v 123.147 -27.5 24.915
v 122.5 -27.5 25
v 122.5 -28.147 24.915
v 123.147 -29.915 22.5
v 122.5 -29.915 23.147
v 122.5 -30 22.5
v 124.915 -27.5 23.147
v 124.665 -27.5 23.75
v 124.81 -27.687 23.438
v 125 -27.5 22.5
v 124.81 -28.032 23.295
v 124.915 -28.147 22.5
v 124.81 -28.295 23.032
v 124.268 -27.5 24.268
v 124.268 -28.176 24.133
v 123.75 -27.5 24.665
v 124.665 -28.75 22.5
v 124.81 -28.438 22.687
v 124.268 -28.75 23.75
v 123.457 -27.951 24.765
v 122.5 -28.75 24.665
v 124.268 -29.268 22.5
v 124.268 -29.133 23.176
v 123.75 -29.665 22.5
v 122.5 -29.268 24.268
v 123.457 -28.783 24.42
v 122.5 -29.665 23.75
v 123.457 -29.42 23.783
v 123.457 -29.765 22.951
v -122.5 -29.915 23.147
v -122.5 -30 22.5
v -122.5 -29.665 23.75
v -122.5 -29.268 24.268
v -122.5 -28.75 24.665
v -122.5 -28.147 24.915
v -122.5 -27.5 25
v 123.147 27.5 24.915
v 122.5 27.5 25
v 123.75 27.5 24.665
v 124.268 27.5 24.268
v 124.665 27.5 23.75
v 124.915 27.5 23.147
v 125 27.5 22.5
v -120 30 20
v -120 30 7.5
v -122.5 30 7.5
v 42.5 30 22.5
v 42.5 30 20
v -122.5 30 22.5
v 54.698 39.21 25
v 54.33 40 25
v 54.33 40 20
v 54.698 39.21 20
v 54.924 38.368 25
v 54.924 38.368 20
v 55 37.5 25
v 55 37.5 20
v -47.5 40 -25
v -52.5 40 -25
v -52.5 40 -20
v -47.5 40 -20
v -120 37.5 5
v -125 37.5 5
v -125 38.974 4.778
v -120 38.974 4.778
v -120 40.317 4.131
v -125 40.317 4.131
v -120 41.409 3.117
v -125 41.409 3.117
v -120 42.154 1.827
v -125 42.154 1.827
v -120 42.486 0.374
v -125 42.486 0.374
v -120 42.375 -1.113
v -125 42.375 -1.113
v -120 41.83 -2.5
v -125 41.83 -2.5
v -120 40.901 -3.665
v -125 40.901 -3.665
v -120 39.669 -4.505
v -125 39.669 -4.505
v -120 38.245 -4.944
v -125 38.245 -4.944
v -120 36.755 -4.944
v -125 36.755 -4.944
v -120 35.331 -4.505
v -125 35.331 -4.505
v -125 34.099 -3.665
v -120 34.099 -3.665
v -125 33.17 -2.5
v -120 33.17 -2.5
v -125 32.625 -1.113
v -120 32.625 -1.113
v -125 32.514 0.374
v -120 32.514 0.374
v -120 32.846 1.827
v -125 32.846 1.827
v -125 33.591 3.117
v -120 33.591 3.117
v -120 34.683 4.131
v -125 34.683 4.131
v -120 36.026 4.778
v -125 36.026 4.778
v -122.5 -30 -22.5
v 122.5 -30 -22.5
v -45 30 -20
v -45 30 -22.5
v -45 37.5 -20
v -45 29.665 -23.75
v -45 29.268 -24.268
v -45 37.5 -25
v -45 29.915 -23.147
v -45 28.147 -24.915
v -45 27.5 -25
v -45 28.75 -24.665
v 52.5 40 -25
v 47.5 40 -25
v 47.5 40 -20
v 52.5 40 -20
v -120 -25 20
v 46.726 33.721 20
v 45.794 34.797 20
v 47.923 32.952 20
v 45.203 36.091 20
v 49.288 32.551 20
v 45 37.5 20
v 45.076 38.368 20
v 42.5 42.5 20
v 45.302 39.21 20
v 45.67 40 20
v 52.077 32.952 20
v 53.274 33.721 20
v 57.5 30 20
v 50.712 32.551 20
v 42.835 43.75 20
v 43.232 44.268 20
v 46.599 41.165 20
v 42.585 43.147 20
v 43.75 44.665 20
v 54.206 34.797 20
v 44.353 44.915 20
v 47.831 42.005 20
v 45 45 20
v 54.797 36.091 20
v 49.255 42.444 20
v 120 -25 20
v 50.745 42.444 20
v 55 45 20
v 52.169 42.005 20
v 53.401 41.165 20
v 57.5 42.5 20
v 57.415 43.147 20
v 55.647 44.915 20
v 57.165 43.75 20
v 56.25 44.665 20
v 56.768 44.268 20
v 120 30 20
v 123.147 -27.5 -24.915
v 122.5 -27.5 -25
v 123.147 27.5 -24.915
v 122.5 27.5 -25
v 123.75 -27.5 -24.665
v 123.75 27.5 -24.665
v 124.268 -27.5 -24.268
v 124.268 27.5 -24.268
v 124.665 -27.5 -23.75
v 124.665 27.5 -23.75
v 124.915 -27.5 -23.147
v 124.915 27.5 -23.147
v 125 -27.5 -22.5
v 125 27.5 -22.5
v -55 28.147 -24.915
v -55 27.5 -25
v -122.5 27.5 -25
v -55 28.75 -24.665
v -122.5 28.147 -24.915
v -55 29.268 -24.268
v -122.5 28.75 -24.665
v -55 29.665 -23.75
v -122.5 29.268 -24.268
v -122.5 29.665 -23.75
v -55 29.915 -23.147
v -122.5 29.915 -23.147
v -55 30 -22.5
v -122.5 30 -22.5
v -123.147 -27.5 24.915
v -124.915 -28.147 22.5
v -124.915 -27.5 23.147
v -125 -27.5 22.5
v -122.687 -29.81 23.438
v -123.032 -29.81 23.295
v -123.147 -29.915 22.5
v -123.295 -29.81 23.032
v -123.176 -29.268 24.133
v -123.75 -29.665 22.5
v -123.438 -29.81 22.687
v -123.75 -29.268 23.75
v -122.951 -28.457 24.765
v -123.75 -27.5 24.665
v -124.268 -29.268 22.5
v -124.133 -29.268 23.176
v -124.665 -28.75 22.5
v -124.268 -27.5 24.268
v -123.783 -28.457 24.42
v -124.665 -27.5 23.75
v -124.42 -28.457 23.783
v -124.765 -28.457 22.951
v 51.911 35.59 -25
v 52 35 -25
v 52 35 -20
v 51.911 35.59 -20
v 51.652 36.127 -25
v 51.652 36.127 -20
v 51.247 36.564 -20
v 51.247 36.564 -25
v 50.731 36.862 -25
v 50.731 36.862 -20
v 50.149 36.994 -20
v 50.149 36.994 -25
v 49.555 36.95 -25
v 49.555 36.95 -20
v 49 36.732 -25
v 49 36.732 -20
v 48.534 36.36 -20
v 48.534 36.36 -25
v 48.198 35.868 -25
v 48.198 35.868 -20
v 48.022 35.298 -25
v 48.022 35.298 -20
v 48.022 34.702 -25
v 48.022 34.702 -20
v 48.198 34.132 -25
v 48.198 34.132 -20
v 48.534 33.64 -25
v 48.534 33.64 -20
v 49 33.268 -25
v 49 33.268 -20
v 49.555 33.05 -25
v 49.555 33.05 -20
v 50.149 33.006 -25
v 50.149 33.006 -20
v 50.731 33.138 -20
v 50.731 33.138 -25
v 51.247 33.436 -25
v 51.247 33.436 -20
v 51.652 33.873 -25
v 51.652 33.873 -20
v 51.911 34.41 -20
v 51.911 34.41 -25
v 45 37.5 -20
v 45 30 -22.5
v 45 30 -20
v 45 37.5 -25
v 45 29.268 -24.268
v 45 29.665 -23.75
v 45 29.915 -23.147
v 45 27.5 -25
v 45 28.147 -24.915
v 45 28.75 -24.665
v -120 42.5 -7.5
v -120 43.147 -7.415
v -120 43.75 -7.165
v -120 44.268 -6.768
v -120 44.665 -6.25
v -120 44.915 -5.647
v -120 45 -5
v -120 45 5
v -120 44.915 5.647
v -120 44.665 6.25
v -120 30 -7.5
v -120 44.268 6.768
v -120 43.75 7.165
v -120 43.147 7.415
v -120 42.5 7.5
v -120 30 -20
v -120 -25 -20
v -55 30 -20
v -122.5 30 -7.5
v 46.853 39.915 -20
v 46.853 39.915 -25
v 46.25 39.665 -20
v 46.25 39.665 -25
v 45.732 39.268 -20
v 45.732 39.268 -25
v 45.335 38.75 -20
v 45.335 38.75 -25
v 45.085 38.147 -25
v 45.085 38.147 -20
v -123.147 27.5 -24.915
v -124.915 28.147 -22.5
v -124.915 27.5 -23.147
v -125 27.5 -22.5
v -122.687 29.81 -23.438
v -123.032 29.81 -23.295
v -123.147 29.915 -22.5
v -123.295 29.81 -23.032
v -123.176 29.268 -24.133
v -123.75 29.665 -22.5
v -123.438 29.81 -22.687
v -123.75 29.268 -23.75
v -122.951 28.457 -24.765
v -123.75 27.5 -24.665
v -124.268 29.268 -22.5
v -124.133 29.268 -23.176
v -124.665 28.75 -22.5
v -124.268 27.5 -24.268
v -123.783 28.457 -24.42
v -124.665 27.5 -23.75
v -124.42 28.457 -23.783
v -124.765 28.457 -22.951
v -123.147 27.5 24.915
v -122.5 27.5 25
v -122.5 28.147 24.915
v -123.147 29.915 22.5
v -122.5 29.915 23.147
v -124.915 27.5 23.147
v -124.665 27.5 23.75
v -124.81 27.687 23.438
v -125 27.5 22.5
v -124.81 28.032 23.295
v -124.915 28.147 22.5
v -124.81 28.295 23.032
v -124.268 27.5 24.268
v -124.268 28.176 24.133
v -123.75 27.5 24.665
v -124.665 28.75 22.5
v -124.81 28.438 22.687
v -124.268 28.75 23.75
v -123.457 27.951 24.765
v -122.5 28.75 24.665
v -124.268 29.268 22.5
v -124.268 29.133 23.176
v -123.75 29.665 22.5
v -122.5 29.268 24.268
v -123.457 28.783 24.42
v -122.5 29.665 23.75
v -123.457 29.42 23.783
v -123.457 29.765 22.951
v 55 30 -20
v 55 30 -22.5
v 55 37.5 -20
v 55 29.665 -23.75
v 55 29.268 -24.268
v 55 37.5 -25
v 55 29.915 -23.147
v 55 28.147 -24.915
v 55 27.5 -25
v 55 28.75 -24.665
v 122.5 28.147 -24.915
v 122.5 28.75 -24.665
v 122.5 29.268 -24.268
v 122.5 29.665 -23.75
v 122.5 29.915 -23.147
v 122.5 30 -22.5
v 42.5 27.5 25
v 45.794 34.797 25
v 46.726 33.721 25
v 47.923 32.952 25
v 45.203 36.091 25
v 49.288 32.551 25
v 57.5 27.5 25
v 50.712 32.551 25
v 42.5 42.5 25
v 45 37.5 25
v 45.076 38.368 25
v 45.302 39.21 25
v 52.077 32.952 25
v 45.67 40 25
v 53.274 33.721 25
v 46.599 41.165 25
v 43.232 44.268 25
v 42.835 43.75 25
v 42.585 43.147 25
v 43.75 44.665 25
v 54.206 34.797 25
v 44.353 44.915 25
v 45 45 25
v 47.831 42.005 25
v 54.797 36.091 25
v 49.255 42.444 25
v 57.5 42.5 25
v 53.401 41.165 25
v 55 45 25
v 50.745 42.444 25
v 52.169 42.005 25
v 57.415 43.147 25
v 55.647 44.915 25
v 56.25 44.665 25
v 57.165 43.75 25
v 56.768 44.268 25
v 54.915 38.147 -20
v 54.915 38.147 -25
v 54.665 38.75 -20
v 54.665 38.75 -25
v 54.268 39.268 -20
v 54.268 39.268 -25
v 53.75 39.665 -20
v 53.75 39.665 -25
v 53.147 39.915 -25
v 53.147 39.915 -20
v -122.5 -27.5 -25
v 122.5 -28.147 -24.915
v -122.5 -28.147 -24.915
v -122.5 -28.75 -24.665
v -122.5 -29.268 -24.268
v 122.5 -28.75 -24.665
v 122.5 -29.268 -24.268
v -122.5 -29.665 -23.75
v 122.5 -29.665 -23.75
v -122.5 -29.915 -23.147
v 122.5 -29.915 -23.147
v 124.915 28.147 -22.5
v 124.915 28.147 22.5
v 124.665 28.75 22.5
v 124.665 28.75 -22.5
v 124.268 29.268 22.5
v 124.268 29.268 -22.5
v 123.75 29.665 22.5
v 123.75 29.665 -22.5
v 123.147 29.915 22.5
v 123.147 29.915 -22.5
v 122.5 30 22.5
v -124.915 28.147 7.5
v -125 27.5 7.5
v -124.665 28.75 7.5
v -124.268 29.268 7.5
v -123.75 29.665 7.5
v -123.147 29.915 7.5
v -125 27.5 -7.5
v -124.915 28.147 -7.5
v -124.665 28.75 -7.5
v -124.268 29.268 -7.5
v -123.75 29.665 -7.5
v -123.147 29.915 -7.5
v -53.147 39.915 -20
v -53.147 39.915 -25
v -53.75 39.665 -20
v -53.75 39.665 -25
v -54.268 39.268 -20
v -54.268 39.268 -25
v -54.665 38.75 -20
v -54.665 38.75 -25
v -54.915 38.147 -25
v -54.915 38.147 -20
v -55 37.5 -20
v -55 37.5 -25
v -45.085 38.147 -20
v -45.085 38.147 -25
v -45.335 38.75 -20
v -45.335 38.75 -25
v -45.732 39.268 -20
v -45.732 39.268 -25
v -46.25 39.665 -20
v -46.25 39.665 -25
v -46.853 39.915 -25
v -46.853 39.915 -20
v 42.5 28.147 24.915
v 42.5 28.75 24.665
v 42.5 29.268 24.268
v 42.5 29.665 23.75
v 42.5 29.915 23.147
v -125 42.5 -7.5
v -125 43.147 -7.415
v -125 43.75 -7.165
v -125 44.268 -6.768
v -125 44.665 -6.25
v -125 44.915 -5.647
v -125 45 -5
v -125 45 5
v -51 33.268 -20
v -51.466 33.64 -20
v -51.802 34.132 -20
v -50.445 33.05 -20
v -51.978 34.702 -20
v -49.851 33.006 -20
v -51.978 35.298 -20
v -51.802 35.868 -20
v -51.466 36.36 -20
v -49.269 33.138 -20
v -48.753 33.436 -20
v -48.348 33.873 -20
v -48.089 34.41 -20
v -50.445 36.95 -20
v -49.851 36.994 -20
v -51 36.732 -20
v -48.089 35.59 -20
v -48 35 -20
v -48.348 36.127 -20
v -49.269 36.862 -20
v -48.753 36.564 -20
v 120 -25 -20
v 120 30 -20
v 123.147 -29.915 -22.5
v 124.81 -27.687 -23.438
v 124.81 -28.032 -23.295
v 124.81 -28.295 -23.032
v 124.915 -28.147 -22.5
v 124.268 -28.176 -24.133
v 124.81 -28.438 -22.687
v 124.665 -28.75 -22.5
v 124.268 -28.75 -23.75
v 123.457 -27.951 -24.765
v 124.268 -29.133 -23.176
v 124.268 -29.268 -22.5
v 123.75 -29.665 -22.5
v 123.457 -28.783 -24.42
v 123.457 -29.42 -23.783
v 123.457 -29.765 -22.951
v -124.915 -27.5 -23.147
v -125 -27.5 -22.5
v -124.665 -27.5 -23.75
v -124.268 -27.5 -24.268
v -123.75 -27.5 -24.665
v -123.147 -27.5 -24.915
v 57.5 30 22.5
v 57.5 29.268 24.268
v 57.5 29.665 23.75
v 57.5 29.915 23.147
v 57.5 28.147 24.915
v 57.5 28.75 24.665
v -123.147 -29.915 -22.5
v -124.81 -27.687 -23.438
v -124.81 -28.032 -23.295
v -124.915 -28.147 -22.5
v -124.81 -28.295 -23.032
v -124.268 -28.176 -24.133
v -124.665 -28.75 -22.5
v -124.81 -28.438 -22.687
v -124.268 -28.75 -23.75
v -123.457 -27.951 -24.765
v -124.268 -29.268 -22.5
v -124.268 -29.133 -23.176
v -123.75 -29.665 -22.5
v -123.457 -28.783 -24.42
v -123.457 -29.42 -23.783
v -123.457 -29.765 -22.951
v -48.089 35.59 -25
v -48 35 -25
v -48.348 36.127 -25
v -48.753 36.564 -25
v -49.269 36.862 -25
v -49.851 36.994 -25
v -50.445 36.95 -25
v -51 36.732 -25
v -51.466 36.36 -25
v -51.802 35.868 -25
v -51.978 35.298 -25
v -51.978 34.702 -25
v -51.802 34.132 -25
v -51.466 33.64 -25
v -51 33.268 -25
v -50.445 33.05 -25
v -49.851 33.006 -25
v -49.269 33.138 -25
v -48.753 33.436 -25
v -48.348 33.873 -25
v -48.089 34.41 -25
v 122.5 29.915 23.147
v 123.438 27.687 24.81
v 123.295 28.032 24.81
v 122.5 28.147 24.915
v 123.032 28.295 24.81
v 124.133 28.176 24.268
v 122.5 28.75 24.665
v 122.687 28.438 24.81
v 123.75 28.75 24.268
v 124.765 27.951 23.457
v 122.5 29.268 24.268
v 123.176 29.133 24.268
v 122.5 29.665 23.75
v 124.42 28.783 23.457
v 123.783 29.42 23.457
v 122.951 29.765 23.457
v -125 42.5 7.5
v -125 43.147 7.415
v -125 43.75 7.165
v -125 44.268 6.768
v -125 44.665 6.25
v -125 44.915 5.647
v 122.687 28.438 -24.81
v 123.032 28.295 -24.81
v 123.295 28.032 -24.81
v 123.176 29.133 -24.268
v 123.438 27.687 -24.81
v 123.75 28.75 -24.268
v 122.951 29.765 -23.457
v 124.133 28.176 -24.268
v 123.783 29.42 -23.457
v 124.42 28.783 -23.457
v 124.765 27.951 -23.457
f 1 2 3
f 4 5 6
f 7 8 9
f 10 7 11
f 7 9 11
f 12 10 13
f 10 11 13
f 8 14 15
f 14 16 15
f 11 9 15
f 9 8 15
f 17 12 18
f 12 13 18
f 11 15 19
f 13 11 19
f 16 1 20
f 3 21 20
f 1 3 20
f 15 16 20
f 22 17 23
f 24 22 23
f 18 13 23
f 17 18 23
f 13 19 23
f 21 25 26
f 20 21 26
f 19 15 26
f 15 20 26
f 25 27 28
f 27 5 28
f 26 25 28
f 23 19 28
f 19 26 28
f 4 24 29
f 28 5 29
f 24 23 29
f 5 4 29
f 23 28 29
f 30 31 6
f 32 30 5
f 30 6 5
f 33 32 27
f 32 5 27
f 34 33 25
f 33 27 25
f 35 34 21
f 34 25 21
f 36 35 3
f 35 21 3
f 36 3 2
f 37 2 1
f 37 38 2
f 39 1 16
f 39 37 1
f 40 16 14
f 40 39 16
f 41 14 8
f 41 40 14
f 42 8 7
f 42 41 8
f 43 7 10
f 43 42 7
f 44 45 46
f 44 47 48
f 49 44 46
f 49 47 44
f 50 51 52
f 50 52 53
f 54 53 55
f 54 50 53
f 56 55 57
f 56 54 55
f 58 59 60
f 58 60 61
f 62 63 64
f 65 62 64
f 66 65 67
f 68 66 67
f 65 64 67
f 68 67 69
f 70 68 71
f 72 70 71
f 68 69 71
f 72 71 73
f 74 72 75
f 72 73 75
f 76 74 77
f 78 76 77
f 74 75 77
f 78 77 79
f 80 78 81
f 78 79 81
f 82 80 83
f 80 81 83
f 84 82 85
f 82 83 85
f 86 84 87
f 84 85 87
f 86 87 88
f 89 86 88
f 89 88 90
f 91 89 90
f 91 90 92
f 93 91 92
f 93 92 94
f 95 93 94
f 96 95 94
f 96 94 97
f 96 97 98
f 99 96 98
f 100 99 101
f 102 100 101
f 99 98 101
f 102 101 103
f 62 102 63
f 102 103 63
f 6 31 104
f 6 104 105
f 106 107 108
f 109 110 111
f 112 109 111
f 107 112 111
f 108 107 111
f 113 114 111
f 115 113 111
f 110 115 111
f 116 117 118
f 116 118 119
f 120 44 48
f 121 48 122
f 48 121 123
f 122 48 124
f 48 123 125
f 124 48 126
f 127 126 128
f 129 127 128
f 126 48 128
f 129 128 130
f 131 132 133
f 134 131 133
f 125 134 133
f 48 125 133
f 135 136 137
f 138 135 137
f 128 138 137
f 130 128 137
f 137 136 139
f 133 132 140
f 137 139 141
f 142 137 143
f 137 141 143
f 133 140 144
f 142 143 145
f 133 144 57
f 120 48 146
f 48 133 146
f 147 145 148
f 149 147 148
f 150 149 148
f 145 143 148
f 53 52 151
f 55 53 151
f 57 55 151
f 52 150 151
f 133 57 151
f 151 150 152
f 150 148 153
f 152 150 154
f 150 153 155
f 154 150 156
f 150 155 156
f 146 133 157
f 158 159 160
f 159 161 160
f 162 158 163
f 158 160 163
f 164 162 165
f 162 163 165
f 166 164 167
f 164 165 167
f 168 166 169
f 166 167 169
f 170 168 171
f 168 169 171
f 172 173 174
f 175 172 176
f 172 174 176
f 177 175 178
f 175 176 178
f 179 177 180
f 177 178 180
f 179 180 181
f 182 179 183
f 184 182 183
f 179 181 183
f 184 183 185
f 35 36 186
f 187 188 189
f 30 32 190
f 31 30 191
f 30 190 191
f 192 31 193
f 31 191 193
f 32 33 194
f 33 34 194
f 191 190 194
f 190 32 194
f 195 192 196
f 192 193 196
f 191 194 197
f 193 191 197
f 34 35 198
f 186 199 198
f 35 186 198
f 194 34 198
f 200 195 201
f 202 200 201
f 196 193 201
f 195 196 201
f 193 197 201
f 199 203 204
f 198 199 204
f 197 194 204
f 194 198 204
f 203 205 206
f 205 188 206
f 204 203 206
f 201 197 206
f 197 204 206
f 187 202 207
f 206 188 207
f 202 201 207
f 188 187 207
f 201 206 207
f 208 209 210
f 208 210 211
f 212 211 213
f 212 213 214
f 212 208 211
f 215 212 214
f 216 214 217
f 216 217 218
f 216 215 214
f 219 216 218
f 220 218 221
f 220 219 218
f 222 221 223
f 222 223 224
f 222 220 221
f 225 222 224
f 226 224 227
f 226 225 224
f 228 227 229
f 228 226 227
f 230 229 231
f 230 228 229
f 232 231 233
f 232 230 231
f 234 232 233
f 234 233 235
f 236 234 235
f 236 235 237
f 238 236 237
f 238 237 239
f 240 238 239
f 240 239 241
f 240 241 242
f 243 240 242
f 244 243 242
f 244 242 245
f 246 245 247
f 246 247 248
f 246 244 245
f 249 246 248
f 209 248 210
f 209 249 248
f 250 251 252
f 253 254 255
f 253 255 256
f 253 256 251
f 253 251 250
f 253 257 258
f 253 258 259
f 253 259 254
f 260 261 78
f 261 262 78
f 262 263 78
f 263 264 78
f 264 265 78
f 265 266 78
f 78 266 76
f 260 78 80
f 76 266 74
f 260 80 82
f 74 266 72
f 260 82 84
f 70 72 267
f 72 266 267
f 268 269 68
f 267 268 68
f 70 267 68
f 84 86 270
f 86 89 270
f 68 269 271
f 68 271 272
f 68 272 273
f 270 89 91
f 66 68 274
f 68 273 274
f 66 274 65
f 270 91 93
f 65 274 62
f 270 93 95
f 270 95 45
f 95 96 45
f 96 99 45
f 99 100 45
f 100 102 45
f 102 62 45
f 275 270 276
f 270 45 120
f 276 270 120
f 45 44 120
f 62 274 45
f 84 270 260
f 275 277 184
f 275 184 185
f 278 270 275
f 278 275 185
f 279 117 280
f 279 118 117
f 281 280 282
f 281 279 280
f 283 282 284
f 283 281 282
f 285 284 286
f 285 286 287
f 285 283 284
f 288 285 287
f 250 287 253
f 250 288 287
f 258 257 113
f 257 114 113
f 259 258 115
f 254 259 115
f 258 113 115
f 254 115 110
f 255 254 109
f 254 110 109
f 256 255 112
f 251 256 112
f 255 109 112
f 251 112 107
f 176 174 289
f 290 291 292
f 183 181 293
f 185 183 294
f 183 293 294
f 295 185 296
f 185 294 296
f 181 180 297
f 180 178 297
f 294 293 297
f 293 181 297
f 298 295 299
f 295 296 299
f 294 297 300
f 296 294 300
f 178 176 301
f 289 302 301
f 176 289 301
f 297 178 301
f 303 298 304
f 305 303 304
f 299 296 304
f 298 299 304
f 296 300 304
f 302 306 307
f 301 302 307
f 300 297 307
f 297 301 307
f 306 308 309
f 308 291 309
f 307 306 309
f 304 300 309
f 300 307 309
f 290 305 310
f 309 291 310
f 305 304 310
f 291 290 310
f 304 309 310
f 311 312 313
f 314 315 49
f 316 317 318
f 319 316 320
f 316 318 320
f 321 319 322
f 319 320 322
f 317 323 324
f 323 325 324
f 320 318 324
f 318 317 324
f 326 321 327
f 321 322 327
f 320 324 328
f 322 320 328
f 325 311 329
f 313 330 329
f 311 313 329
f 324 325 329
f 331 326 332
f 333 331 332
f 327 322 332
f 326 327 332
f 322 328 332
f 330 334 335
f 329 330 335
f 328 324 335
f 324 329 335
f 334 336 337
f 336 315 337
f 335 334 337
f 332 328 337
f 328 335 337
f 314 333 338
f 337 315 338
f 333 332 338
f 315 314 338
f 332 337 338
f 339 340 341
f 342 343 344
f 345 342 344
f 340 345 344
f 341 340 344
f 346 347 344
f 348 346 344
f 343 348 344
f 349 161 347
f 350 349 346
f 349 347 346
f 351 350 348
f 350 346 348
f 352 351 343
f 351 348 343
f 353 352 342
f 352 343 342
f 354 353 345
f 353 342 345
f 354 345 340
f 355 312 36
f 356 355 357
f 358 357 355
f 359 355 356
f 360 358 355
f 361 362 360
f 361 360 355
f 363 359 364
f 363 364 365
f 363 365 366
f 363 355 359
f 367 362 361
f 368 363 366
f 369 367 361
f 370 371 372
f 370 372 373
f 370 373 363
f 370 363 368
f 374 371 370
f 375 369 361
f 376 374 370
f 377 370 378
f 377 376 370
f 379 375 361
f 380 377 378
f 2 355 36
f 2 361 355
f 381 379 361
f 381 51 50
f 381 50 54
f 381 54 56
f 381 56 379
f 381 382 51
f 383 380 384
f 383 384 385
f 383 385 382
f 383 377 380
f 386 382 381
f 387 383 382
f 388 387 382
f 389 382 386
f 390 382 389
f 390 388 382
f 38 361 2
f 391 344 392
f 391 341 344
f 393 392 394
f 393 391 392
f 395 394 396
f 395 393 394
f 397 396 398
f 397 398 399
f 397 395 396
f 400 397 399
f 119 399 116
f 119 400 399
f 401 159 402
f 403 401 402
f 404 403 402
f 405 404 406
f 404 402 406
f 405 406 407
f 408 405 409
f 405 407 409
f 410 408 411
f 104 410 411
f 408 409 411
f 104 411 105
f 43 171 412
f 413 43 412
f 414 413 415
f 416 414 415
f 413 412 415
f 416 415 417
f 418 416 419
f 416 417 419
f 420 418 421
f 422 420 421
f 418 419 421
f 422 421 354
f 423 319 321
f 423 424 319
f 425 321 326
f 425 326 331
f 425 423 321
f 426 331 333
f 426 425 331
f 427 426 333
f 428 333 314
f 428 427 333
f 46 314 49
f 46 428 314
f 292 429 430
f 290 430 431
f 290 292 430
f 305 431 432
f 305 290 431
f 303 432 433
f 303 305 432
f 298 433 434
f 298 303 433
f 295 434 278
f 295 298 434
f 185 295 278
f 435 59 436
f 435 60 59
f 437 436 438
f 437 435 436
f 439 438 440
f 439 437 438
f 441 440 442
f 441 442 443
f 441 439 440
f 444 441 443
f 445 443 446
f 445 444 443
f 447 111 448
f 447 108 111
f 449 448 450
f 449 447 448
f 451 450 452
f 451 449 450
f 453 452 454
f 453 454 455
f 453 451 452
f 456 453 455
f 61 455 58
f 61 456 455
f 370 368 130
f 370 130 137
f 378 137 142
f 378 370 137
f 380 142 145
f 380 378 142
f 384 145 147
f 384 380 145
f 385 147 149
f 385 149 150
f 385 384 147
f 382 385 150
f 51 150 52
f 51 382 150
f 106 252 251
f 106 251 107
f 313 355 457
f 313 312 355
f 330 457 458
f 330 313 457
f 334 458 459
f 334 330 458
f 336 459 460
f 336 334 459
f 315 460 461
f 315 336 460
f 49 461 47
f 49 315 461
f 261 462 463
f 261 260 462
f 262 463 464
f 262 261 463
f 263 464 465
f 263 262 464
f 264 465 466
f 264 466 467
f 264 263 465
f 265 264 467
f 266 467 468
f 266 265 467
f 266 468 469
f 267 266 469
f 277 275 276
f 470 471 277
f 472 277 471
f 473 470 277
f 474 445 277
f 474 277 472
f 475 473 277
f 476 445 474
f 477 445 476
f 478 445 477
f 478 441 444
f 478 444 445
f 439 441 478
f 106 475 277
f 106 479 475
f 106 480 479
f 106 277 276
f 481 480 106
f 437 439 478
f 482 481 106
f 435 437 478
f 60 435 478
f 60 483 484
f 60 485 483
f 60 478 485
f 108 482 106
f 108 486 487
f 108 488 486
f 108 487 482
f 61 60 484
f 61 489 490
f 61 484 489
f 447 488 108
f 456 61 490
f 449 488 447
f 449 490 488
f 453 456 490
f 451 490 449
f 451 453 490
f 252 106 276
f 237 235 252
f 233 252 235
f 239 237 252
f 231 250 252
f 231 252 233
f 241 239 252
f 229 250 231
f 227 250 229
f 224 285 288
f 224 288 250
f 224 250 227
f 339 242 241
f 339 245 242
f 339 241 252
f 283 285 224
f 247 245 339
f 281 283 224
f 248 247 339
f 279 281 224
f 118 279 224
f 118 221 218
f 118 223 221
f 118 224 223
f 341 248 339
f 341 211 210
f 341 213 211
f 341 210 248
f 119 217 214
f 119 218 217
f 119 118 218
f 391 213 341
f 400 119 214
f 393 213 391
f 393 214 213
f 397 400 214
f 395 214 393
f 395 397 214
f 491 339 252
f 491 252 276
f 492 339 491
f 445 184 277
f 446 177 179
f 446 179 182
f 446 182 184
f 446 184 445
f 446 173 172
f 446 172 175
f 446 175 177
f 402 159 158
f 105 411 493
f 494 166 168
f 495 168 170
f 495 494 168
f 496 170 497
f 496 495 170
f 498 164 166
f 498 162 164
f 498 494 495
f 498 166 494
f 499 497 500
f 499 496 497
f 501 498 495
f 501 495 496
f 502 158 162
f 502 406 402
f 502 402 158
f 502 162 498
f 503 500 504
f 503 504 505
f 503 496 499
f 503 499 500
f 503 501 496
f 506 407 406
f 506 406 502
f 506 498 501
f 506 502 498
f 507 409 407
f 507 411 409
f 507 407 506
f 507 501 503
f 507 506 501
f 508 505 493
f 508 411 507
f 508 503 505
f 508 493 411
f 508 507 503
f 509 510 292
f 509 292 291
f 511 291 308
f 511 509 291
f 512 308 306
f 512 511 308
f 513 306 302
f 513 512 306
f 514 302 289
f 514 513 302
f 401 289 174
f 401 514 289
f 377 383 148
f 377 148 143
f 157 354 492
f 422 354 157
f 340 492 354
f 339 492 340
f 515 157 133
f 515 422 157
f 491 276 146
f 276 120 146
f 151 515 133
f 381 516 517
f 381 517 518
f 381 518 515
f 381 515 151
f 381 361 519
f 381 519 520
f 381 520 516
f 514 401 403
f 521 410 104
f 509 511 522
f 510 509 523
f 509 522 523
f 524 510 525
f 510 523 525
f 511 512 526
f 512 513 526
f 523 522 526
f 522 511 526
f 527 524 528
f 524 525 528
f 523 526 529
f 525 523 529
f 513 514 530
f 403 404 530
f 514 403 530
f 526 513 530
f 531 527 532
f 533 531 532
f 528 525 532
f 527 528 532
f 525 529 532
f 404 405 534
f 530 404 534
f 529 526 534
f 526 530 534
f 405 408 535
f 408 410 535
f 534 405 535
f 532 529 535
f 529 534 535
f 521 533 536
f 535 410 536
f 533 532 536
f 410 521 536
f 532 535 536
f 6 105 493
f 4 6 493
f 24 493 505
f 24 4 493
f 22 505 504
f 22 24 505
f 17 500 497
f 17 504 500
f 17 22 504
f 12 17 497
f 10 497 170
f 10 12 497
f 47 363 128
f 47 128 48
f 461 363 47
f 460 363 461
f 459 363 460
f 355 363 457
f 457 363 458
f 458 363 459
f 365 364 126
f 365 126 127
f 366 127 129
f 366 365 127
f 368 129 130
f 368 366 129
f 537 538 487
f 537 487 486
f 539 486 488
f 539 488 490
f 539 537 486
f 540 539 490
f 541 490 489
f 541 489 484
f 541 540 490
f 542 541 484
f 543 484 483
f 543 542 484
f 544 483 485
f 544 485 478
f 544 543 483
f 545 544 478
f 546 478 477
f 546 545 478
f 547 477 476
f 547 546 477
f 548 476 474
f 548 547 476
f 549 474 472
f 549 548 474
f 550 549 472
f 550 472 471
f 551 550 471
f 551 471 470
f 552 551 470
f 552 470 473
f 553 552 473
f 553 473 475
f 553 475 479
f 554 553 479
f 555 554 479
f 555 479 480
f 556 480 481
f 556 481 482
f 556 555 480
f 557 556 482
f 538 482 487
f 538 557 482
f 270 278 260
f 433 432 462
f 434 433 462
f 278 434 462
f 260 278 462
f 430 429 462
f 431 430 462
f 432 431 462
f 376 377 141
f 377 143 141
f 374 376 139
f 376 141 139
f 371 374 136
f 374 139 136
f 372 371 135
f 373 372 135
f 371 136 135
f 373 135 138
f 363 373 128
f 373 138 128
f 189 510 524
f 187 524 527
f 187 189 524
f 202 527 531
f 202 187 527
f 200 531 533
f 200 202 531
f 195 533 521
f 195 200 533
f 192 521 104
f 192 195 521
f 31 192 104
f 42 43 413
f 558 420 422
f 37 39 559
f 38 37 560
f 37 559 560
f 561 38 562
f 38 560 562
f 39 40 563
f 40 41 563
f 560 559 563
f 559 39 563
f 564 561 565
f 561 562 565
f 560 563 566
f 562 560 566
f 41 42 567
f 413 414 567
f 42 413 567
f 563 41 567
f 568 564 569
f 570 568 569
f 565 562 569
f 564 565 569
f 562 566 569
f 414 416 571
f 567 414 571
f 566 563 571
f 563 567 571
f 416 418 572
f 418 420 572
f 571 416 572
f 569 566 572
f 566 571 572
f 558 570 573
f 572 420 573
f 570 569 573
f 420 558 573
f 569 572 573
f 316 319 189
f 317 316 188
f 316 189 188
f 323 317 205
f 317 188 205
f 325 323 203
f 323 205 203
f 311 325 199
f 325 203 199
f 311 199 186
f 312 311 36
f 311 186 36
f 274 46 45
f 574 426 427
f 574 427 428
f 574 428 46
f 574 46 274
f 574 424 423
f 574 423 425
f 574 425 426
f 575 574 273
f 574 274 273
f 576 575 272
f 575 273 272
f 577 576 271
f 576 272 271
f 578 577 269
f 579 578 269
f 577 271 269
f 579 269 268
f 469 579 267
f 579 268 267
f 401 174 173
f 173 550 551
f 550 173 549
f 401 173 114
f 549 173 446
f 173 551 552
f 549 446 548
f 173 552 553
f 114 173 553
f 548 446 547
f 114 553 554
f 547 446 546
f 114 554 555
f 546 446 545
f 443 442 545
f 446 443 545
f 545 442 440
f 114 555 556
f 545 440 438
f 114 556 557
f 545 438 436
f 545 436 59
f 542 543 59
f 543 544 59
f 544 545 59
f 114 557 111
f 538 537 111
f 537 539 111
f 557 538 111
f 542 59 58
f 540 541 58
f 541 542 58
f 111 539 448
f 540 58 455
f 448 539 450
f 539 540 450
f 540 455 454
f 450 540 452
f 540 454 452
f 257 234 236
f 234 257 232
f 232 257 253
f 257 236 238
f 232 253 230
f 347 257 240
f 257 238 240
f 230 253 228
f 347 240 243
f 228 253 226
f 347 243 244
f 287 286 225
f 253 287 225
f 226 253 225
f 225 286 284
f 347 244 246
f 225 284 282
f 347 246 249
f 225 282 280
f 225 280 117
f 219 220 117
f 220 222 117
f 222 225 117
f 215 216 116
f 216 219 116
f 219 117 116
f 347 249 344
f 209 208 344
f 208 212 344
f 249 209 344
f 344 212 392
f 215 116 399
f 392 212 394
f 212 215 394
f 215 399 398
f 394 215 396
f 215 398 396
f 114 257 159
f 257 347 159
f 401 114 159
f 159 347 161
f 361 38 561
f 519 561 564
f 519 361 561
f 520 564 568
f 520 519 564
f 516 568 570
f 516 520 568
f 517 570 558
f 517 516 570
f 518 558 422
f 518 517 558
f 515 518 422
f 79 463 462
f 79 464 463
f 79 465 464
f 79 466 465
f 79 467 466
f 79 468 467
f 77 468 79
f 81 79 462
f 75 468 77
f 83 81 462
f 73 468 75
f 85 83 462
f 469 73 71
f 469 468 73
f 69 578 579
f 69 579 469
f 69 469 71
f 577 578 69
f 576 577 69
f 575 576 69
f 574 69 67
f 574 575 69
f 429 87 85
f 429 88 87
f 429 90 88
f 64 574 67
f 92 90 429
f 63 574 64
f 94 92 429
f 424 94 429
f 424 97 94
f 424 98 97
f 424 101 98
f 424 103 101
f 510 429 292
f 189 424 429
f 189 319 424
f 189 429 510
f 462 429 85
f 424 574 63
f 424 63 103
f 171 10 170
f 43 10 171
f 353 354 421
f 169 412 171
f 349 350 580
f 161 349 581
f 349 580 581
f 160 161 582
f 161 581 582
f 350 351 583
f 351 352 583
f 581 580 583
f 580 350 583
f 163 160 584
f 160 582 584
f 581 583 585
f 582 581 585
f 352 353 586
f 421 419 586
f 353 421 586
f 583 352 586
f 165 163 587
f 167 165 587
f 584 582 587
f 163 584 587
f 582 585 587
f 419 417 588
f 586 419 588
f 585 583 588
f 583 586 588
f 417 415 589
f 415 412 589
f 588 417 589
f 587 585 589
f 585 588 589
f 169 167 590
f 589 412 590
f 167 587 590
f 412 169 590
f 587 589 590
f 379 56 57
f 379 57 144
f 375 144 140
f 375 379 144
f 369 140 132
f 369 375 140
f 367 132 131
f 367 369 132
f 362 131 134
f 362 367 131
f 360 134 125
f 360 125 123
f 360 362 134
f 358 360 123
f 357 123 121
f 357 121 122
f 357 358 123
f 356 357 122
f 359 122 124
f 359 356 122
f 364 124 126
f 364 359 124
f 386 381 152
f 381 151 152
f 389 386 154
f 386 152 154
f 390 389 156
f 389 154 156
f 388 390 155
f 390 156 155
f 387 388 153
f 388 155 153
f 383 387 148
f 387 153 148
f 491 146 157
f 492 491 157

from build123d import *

# Parameters (mm, degrees)
SKETCH1_W           = 240
SKETCH1_H           = 50
BOSS_EXTRUDE1_DEPTH = 25
SKETCH1_5_W         = 240
SKETCH1_5_H         = 50
CUT_EXTRUDE1_DEPTH  = 20
BOSS_EXTRUDE3_START = -25
SKETCH1_6_W         = 10
SKETCH1_6_H         = 10
SKETCH1_6_R         = 2
BOSS_EXTRUDE3_DEPTH = 5
BOSS_EXTRUDE4_START = 25
BOSS_EXTRUDE4_DEPTH = 5
SKETCH2_W           = 15
SKETCH2_H           = 15
SKETCH2_R           = 5
BOSS_EXTRUDE5_DEPTH = 5
FILLET1_R           = 2.5


with BuildPart() as part:
    # Sketch1 → Boss-Extrude1 (new, symmetric)
    with BuildSketch(Plane.XY):
        Polygon((-125, 30), (-125, -30), (125, -30), (125, 30), (120, 30), (120, 25), (120, -25), (-120, -25), (-120, 25), (-120, 30), align=None)
        Rectangle(SKETCH1_W, SKETCH1_H)
        Polygon((-55, 30), (-120, 30), (-120, 25), (120, 25), (120, 30), (57.5, 30), (55, 30), (45, 30), (42.5, 30), (-45, 30), align=None)
    extrude(amount=BOSS_EXTRUDE1_DEPTH, both=True)

    # Sketch1<5> → Cut-Extrude1 (cut, symmetric)
    with BuildSketch(Plane.XY):
        Rectangle(SKETCH1_5_W, SKETCH1_5_H)
        Polygon((-55, 30), (-120, 30), (-120, 25), (120, 25), (120, 30), (57.5, 30), (55, 30), (45, 30), (42.5, 30), (-45, 30), align=None)
    extrude(amount=CUT_EXTRUDE1_DEPTH, both=True, mode=Mode.SUBTRACT)

    # Sketch1<6> → Boss-Extrude3 (add)
    with BuildSketch(Plane.XY.offset(BOSS_EXTRUDE3_START)):
        with Locations((-50, 35)):
            Rectangle(SKETCH1_6_W, SKETCH1_6_H)
        with Locations((-50, 35)):
            Circle(SKETCH1_6_R, mode=Mode.SUBTRACT)
        with Locations((50, 35)):
            Rectangle(SKETCH1_6_W, SKETCH1_6_H)
        with Locations((50, 35)):
            Circle(SKETCH1_6_R, mode=Mode.SUBTRACT)
    extrude(amount=BOSS_EXTRUDE3_DEPTH)

    # Sketch1<8> → Boss-Extrude4 (add)
    with BuildSketch(Plane.XY.offset(BOSS_EXTRUDE4_START)):
        with BuildLine():
            Line((45, 30), (55, 30))
            Line((55, 30), (55, 37.5))
            ThreePointArc((55, 37.5), (50, 32.5), (45, 37.5))
            Line((45, 37.5), (45, 30))
        make_face()
        with BuildLine():
            Line((55, 30), (57.5, 30))
            Line((57.5, 30), (57.5, 45))
            Line((57.5, 45), (42.5, 45))
            Line((42.5, 45), (42.5, 30))
            Line((42.5, 30), (45, 30))
            Line((45, 30), (45, 37.5))
            Line((45, 37.5), (45, 40))
            Line((45, 40), (45.669872981, 40))
            ThreePointArc((45.669872981, 40), (50, 42.5), (54.330127019, 40))
            Line((54.330127019, 40), (55, 40))
            Line((55, 40), (55, 37.5))
            Line((55, 37.5), (55, 30))
        make_face()
        with BuildLine():
            Line((45, 40), (45, 37.5))
            ThreePointArc((45, 37.5), (45.170370869, 38.794095226), (45.669872981, 40))
            Line((45.669872981, 40), (45, 40))
        make_face()
        with BuildLine():
            ThreePointArc((54.330127019, 40), (54.829629131, 38.794095226), (55, 37.5))
            Line((55, 37.5), (55, 40))
            Line((55, 40), (54.330127019, 40))
        make_face()
    extrude(amount=-BOSS_EXTRUDE4_DEPTH)

    # Sketch2 → Boss-Extrude5 (add)
    with BuildSketch(Plane.ZY.offset(125)):
        with Locations((0, 37.5)):
            Rectangle(SKETCH2_W, SKETCH2_H)
        with Locations((0, 37.5)):
            Circle(SKETCH2_R, mode=Mode.SUBTRACT)
    extrude(amount=-BOSS_EXTRUDE5_DEPTH)

    # Fillet1
    fillet1_edges = [part.edges().sort_by_distance(p)[0] for p in [
        (-41.25, 30, 25),
        (125, 30, 0),
        (-125, 0, 25),
        (0, -30, 25),
        (0, 30, -25),
        (-45, 40, -22.5),
        (-55, 40, -22.5),
        (90, 30, -25),
        (55, 40, -22.5),
        (125, 0, 25),
        (45, 40, -22.5),
        (0, -30, -25),
        (91.25, 30, 25),
        (-125, 0, -25),
        (57.5, 45, 22.5),
        (42.5, 45, 22.5),
        (-90, 30, -25),
        (125, 0, -25),
        (-125, 30, -16.25),
        (-122.5, 45, 7.5),
        (-122.5, 45, -7.5),
        (125, -30, 0),
        (-125, -30, 0),
        (-125, 30, 16.25),
    ]]
    fillet(fillet1_edges, radius=FILLET1_R)


solid = part.part
